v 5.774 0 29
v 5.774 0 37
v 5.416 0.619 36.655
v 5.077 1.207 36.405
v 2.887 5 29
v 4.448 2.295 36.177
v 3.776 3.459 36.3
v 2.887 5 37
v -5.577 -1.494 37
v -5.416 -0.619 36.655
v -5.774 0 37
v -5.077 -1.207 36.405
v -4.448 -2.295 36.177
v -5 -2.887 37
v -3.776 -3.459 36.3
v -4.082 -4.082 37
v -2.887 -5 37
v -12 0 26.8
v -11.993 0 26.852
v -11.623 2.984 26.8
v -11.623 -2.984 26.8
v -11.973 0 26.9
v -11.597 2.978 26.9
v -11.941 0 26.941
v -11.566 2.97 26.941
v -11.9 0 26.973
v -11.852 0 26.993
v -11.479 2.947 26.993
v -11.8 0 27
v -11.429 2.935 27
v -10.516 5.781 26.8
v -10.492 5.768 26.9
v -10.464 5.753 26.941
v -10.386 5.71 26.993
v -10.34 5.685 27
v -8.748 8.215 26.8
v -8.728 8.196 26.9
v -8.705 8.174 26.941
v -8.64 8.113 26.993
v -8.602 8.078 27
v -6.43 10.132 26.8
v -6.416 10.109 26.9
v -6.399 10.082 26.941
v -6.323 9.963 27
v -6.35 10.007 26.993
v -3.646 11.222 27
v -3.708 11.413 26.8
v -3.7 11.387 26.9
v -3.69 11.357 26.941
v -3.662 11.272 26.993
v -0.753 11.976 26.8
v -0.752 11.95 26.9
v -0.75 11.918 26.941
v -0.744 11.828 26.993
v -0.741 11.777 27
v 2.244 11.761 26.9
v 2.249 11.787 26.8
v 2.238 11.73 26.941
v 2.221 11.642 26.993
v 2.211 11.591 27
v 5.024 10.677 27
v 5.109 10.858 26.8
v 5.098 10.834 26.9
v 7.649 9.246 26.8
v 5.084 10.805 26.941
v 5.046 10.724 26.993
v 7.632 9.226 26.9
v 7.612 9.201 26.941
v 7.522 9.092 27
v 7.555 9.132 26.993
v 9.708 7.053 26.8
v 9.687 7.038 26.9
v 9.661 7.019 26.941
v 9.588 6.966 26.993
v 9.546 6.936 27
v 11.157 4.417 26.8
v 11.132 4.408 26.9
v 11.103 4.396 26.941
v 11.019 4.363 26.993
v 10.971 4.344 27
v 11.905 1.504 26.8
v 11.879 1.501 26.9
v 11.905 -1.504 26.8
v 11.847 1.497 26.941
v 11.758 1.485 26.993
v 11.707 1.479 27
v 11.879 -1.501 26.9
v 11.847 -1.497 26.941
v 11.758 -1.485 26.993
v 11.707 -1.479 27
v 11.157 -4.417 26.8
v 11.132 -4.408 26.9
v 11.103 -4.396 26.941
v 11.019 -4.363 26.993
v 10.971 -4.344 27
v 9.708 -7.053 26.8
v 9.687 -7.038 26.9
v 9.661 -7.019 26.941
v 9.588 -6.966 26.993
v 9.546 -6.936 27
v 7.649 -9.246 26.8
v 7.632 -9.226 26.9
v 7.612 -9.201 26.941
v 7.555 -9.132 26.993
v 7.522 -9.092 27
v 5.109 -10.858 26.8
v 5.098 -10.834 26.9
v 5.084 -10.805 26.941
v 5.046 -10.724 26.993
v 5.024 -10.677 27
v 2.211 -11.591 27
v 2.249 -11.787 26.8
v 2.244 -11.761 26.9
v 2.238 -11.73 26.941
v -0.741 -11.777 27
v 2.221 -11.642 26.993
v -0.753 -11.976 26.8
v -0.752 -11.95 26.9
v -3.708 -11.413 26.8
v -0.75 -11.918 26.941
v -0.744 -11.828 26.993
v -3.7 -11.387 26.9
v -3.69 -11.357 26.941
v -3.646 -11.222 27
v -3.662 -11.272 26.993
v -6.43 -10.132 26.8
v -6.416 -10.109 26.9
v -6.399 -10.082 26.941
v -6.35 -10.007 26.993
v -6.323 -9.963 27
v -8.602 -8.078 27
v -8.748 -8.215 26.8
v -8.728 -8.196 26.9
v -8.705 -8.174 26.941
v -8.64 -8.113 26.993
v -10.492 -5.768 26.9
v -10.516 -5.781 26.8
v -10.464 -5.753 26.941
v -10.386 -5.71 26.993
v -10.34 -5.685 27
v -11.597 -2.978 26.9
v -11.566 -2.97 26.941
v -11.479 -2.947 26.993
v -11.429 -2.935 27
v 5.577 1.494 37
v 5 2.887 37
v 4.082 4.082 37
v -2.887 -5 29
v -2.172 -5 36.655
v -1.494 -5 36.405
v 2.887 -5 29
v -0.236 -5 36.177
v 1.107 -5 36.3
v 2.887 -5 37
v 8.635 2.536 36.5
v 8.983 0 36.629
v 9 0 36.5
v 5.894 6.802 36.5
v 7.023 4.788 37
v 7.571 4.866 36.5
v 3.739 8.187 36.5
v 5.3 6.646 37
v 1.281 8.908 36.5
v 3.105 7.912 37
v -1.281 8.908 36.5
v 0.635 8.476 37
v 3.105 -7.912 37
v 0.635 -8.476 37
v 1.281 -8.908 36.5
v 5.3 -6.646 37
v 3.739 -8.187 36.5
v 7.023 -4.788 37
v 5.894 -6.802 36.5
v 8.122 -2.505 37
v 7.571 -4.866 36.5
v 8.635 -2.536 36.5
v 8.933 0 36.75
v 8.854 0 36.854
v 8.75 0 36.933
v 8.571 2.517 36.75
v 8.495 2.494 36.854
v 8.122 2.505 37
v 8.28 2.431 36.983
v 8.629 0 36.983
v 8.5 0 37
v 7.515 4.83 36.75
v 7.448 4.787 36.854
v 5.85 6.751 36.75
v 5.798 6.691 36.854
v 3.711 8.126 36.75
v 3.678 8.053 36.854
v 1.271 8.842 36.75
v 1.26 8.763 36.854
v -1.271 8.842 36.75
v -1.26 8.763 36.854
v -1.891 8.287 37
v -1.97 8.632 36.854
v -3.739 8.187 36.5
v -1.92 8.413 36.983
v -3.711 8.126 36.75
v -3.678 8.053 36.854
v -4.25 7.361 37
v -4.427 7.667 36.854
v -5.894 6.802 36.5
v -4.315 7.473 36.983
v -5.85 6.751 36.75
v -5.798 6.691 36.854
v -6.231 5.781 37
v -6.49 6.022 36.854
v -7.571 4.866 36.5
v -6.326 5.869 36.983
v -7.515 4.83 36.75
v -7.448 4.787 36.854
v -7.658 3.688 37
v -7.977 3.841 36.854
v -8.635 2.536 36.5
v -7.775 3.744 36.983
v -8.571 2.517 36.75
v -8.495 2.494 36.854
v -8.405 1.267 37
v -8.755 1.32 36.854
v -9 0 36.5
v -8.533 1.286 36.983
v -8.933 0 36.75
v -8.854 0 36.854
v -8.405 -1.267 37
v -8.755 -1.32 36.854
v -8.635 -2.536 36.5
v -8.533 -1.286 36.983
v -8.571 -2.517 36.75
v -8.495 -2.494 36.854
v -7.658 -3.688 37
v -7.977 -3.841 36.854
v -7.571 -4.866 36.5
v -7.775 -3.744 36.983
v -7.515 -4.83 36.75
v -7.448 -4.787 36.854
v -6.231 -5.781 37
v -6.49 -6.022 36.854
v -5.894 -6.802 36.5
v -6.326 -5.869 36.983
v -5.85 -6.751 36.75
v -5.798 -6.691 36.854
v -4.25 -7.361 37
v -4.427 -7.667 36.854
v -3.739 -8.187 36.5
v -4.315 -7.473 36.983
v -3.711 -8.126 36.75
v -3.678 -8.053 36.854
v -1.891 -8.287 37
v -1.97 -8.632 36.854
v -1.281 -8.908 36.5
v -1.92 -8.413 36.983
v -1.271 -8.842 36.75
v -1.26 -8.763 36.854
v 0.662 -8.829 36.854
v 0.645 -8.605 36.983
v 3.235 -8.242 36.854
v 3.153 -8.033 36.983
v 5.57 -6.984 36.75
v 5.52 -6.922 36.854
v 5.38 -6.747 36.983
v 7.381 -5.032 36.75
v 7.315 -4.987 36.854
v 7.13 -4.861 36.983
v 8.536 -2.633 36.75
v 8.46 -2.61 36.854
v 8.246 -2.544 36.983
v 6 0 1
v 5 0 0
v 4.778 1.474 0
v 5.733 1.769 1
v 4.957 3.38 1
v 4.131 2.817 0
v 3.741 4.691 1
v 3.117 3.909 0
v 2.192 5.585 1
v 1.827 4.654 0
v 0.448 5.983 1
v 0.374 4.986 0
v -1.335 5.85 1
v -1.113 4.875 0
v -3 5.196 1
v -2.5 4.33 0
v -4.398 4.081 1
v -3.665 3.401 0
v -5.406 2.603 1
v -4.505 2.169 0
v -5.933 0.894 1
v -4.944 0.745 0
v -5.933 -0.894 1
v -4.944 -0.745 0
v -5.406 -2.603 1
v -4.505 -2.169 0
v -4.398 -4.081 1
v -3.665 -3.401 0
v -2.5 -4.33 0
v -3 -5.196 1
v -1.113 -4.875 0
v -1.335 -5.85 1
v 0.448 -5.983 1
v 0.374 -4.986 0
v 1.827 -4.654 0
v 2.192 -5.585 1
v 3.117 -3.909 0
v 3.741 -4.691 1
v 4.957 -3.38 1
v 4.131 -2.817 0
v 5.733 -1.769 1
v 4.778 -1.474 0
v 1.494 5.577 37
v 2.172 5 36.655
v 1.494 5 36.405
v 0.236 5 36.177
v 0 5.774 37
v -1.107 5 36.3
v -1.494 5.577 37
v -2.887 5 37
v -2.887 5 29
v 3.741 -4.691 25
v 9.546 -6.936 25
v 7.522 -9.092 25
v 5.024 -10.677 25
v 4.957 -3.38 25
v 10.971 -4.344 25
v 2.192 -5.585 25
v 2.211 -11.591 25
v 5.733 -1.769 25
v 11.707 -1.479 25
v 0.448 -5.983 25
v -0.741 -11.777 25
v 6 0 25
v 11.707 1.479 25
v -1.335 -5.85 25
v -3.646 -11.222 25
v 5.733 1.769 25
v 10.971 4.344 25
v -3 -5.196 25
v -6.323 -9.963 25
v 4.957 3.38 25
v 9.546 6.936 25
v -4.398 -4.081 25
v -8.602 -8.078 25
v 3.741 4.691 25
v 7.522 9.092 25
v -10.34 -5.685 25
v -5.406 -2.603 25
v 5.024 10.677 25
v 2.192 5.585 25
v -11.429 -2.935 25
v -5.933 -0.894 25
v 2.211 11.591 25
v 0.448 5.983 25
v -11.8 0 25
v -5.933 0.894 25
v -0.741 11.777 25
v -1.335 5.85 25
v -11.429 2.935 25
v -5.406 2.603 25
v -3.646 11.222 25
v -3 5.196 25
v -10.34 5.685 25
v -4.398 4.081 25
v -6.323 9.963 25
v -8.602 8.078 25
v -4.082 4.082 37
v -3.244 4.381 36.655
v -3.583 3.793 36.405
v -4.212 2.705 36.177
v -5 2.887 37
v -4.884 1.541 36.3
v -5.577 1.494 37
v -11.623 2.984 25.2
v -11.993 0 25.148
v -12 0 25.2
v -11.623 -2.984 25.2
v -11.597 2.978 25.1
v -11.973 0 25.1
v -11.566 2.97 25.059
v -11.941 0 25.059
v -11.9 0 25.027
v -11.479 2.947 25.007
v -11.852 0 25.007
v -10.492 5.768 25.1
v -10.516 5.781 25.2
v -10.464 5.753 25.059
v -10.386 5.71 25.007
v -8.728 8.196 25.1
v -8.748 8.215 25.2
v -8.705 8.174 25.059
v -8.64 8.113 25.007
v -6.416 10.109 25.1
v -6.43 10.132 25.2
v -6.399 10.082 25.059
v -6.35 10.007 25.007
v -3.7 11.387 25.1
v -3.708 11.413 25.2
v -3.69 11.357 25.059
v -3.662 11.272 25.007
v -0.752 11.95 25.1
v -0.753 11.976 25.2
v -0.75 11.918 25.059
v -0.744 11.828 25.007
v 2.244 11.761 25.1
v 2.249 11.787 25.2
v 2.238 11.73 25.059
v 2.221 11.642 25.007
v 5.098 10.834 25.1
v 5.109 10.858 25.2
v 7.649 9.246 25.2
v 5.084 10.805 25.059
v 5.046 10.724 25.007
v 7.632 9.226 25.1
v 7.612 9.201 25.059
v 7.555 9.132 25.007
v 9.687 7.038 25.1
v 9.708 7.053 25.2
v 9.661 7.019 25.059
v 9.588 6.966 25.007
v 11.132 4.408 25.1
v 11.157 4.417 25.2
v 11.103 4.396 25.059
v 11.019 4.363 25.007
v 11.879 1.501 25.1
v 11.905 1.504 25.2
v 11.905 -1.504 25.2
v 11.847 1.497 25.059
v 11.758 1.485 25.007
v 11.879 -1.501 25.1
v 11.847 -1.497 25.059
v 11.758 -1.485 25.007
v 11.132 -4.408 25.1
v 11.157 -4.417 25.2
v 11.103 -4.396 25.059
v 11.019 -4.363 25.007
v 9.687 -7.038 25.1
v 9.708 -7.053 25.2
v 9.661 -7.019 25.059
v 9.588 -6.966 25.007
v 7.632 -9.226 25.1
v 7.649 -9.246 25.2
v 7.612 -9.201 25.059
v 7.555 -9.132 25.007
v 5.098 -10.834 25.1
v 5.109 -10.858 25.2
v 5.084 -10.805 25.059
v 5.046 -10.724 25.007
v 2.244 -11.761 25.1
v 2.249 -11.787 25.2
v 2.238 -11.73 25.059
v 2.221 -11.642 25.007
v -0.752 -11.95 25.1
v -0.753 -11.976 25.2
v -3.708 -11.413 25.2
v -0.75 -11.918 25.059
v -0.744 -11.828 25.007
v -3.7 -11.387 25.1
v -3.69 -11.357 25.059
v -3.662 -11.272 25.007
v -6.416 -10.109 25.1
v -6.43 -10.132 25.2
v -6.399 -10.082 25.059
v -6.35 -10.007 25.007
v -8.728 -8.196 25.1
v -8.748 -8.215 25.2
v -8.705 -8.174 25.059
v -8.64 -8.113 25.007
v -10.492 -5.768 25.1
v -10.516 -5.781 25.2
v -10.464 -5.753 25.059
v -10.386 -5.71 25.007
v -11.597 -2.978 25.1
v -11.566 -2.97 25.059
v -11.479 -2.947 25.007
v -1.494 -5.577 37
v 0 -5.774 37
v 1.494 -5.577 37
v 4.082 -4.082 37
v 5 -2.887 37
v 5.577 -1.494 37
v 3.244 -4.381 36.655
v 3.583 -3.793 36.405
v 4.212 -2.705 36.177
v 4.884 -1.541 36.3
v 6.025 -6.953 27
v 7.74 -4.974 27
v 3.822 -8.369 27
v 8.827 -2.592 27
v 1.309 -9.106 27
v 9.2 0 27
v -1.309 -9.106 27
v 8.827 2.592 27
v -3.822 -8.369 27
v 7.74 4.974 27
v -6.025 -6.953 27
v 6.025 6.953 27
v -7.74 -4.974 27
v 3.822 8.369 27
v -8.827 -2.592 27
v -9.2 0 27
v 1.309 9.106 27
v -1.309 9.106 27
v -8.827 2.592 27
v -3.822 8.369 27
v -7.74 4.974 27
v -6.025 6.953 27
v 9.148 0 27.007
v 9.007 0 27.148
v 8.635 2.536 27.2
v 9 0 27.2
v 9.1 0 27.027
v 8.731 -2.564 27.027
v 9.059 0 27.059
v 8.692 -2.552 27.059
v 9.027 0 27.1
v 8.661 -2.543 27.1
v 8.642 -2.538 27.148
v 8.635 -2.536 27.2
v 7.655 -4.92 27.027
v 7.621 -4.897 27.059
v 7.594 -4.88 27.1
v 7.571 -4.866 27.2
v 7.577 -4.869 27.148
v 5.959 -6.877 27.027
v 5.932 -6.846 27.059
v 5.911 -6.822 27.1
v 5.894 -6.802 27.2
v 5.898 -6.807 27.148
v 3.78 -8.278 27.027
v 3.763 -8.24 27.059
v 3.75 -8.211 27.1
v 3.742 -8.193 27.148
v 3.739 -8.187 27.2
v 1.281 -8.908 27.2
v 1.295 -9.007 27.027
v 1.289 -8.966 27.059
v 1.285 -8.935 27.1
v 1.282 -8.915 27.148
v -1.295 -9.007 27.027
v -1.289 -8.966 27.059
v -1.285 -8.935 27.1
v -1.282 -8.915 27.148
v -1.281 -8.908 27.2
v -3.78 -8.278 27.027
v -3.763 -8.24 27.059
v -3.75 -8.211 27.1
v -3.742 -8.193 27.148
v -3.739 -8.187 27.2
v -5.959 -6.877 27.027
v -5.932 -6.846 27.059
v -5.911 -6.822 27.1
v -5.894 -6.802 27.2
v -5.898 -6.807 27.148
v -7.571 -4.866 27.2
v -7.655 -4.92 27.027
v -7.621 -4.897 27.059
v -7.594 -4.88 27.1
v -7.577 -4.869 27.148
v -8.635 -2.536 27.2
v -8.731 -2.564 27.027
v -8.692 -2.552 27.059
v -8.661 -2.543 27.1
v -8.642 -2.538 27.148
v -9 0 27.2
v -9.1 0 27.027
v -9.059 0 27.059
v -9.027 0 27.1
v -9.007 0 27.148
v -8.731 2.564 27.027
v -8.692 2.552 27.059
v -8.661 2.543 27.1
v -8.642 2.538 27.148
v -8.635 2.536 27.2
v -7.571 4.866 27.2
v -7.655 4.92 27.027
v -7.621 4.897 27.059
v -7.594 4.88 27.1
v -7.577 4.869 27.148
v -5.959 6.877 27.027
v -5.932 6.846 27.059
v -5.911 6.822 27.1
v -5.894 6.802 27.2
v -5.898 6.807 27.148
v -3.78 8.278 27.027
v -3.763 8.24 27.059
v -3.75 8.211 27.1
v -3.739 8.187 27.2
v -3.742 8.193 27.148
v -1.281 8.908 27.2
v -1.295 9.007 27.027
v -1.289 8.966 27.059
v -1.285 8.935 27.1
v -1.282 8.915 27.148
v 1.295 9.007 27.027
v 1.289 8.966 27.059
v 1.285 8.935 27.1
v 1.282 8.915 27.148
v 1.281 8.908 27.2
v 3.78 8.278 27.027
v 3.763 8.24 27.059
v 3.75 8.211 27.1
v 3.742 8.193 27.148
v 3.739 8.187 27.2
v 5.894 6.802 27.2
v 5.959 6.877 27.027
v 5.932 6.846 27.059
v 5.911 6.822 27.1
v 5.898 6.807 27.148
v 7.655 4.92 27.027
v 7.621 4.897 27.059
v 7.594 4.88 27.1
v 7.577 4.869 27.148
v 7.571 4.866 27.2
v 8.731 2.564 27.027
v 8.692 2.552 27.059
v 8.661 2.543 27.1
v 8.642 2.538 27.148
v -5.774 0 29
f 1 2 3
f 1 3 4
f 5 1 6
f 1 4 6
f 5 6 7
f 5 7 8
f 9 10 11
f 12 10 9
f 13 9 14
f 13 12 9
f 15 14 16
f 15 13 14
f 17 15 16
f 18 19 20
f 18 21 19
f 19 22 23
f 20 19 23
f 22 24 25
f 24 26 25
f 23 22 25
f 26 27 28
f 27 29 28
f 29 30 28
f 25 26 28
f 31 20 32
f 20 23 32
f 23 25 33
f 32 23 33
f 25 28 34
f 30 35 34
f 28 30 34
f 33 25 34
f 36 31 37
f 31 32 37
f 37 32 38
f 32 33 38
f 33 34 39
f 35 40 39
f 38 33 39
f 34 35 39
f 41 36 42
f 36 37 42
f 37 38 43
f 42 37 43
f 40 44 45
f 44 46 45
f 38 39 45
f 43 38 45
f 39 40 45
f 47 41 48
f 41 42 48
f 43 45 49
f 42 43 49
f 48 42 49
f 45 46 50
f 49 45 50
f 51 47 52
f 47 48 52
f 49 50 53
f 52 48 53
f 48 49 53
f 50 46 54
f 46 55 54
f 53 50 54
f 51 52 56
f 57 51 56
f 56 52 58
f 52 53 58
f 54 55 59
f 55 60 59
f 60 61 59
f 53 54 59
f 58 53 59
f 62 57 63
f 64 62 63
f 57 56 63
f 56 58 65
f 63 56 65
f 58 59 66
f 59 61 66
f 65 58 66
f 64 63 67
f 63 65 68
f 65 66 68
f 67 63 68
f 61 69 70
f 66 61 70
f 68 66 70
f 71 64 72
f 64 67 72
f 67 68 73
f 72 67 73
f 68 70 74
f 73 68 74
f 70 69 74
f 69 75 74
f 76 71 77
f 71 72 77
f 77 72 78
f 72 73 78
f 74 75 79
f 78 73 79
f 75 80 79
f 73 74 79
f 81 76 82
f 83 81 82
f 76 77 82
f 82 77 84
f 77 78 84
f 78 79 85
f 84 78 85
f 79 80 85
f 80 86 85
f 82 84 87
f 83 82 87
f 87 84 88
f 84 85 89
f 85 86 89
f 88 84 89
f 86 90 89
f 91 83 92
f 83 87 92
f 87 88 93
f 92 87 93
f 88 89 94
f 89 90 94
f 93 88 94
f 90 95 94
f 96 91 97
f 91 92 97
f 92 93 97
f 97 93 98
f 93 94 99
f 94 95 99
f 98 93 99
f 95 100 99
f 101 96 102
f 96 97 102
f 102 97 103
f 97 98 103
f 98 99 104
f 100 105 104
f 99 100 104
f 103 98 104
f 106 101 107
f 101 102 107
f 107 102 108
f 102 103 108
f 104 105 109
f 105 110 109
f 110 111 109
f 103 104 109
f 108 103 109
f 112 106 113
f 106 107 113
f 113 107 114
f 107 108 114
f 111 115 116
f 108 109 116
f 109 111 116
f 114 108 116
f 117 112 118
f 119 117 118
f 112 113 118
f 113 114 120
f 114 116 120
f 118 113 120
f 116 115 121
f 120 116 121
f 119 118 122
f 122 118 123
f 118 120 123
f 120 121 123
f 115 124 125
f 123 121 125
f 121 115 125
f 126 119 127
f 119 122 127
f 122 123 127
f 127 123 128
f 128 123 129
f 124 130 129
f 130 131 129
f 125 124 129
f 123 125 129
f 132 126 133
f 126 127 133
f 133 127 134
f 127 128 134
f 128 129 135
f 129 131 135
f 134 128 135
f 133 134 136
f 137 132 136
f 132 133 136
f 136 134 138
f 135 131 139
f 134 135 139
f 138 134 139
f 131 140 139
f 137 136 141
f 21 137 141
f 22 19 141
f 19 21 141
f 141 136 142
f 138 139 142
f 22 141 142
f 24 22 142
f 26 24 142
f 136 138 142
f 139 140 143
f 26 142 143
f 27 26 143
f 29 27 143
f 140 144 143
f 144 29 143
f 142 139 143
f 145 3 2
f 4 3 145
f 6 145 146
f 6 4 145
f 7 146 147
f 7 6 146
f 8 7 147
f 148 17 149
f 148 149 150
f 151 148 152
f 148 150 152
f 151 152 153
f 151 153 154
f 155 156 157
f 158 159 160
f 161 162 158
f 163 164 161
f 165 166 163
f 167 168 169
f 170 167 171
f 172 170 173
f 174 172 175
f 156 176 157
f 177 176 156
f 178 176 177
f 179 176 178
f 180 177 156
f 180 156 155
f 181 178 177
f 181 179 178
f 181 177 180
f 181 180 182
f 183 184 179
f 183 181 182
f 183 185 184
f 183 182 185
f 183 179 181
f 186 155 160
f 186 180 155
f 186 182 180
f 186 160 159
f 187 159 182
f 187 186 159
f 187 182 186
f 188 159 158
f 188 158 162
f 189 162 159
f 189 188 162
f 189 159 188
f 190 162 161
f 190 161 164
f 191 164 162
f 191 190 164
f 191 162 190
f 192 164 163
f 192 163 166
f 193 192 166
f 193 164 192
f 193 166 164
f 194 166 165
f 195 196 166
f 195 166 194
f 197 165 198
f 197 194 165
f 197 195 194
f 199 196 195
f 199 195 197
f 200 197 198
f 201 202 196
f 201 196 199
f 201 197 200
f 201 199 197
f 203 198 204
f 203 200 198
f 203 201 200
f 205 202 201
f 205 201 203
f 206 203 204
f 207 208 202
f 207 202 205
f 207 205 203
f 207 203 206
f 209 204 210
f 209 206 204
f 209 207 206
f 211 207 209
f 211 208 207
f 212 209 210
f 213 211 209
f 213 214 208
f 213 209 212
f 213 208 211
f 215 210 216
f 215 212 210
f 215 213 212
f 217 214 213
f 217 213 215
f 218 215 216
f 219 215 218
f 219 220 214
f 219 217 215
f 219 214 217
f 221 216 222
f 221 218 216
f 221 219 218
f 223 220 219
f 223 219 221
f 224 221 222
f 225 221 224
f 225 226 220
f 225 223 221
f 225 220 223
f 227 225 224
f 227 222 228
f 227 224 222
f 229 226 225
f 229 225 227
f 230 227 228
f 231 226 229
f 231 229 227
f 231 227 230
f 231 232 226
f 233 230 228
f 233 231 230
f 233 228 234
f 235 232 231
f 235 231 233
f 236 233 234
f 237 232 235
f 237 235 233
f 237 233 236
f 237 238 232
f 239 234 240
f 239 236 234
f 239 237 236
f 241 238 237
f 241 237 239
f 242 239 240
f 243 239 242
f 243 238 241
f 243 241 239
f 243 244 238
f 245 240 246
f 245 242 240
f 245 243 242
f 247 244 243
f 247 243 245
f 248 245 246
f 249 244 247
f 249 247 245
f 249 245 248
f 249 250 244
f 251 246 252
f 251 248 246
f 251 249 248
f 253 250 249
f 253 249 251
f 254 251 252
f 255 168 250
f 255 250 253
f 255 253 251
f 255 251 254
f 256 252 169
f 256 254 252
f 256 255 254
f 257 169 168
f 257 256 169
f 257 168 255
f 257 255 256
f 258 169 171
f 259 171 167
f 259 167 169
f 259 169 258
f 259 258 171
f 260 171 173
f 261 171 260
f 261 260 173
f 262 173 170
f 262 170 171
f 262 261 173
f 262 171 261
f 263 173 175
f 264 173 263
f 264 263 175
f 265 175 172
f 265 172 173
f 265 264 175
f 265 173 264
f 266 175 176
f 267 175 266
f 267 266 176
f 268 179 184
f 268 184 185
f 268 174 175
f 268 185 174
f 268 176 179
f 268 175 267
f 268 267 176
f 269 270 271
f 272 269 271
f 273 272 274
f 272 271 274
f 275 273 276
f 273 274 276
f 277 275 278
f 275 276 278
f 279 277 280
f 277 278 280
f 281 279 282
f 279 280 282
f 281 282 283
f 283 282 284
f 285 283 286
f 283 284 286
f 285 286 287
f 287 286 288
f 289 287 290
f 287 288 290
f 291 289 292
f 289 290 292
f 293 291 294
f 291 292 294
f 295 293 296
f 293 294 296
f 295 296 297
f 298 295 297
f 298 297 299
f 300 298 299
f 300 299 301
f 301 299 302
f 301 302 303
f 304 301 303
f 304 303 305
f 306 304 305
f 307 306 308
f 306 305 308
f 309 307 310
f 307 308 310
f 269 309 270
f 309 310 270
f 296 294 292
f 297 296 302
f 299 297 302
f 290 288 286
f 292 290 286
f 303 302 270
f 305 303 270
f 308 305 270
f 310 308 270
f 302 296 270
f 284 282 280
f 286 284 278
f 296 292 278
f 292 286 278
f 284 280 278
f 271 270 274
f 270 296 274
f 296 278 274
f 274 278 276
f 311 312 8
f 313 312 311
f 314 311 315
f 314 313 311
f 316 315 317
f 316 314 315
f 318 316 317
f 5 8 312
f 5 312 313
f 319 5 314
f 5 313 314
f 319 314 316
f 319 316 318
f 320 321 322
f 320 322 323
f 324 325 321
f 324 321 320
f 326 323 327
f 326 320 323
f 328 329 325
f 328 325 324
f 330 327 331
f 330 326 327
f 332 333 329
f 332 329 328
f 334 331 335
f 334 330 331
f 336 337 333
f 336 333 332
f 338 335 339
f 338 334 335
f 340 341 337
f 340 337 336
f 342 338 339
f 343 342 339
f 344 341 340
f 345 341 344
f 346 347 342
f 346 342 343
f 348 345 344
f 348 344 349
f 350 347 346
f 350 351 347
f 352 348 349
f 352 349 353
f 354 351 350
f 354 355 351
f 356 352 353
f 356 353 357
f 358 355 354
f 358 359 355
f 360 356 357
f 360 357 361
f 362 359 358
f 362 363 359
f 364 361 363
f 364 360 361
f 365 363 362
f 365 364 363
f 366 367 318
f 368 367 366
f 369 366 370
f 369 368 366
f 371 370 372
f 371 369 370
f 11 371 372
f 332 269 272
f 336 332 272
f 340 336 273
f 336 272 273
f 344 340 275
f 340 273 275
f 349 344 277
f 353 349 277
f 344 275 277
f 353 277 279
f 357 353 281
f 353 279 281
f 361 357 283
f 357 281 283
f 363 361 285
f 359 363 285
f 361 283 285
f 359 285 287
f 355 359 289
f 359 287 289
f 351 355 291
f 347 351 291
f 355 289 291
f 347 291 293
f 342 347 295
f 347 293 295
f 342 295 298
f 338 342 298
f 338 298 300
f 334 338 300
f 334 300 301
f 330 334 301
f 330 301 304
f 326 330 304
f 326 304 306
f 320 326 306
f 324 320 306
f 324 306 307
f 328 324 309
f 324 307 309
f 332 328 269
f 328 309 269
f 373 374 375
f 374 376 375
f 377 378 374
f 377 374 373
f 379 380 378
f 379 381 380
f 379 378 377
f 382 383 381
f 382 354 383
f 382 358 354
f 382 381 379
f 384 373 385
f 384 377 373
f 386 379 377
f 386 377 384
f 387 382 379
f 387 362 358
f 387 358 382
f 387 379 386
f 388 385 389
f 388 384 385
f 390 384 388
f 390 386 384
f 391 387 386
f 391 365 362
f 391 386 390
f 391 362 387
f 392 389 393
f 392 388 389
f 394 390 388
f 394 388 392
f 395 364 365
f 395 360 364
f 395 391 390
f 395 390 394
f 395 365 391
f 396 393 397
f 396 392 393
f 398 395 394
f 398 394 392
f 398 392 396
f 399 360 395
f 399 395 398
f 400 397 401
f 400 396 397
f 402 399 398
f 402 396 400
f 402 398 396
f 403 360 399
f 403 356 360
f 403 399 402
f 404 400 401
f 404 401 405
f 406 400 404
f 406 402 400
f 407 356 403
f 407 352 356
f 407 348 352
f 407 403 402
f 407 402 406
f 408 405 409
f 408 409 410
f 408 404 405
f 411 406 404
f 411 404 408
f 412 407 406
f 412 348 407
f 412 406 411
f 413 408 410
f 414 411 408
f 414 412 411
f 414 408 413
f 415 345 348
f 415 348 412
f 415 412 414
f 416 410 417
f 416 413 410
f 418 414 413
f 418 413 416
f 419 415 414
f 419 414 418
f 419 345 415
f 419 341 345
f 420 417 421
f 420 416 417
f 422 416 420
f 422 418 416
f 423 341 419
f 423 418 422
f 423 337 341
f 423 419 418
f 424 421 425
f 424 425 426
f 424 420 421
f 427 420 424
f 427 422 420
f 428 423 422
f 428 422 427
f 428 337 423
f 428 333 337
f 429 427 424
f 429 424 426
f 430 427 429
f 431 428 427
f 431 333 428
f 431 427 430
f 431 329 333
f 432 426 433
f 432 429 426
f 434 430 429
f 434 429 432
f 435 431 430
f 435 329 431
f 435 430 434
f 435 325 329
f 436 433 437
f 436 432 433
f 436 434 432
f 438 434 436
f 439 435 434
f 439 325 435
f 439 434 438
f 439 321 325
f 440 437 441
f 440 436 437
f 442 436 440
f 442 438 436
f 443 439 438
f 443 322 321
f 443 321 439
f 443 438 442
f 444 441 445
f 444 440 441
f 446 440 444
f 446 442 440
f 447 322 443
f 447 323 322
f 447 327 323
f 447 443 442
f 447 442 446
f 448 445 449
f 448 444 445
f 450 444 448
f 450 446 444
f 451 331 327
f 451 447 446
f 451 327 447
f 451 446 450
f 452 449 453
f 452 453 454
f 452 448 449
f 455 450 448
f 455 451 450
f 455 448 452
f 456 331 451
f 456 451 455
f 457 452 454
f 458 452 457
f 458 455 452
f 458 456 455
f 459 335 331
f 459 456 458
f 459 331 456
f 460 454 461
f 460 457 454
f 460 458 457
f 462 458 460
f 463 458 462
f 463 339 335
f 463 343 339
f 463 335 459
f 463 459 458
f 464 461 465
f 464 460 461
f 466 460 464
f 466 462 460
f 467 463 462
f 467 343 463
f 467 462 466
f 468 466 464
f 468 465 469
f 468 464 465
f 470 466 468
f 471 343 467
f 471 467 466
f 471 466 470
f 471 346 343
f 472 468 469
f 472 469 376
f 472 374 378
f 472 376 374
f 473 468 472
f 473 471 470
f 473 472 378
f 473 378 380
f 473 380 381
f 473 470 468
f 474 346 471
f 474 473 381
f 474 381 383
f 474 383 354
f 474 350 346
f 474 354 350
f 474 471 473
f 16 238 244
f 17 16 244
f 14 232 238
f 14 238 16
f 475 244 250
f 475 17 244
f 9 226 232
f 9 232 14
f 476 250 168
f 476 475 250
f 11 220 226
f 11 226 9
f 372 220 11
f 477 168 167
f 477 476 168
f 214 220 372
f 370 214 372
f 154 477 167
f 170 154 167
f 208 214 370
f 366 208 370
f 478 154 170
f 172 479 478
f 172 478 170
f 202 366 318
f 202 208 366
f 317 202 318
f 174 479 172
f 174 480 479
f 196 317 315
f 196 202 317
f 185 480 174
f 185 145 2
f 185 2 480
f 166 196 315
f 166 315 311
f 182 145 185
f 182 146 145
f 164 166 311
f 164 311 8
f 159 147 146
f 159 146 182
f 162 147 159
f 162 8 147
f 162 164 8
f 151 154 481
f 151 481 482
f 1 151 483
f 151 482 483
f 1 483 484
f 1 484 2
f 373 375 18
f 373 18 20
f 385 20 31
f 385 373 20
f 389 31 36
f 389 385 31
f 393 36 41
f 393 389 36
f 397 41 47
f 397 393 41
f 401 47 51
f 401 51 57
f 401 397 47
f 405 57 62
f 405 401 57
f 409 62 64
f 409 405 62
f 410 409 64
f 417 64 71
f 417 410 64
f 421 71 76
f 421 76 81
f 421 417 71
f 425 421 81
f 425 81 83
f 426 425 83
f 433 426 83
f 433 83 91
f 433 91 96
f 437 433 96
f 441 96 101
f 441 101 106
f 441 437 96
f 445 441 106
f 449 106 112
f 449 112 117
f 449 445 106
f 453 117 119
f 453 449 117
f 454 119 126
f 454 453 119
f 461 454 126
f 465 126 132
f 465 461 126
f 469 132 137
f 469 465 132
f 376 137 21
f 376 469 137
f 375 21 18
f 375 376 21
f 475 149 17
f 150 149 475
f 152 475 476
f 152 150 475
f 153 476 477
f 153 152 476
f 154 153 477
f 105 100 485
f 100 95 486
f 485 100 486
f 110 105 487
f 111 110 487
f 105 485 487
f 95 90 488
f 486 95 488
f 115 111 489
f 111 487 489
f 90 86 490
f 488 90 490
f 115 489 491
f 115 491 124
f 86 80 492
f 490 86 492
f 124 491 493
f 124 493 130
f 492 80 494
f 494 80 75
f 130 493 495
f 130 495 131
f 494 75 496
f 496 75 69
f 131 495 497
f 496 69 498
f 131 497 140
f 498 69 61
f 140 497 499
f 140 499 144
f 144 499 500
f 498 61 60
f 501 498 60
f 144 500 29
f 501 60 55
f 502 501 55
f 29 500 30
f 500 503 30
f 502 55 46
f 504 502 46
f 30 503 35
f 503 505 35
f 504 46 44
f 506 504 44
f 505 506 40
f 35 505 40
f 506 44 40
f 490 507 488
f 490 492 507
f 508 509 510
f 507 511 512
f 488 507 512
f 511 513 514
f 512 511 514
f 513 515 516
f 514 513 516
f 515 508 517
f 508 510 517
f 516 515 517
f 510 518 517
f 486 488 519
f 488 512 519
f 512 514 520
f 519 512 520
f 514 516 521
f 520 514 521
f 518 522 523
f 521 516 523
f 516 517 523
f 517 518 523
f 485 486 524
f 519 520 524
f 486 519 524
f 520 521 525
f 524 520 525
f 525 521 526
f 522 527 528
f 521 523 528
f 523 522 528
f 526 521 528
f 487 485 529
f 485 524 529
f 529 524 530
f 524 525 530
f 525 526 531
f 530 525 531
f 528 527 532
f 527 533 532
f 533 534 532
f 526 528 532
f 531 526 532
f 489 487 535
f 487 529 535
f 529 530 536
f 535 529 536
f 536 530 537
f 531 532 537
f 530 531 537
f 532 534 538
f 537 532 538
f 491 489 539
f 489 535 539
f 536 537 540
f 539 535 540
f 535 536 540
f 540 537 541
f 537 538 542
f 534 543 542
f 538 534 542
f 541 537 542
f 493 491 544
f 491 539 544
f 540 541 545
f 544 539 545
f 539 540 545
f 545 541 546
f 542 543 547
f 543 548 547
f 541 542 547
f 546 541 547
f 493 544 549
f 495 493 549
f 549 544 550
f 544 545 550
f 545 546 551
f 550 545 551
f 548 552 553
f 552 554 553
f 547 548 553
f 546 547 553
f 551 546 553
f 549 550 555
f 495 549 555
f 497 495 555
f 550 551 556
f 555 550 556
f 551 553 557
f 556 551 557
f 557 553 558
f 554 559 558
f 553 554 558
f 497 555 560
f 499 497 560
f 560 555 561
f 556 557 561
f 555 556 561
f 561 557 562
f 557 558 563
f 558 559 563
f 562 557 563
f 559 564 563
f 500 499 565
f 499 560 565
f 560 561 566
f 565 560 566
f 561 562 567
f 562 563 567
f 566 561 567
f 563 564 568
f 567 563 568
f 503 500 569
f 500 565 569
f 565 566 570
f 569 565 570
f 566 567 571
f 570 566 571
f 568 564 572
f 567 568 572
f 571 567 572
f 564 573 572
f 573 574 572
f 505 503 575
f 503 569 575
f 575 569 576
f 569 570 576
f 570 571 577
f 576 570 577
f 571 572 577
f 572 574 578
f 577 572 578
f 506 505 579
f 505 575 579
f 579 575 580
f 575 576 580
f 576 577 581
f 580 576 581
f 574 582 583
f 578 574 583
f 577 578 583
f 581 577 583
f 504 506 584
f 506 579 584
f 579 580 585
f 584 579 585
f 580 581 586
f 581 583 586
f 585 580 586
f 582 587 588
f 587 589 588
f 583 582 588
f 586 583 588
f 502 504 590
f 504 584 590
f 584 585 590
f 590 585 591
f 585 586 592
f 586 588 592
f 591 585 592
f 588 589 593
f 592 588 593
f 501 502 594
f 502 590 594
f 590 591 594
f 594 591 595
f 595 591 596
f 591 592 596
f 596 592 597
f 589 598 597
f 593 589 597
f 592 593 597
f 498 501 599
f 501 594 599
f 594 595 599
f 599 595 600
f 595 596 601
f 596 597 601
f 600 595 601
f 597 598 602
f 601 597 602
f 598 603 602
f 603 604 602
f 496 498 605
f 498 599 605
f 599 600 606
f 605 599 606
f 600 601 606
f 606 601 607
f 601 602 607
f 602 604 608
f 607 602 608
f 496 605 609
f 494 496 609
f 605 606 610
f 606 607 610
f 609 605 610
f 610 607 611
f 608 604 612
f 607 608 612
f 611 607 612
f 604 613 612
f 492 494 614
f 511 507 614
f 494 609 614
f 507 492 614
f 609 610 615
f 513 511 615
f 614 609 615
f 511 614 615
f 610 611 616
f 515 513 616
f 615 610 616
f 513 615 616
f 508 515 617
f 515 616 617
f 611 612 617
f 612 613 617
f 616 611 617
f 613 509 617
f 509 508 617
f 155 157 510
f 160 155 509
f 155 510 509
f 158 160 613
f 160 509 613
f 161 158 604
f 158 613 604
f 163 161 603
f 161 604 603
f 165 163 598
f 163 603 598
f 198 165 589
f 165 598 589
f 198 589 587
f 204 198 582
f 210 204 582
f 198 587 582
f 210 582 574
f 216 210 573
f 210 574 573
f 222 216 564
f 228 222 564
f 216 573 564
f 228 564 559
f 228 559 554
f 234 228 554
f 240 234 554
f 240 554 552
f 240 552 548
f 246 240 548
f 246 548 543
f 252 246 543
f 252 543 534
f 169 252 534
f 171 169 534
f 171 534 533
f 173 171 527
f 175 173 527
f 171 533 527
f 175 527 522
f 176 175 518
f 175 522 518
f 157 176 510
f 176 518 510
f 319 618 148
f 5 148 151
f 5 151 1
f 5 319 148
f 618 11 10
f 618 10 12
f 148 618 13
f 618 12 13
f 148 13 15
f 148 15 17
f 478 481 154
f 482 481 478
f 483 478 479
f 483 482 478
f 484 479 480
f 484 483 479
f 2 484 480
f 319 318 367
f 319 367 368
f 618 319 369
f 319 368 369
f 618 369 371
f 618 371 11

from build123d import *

# Parameters (mm, degrees)
SCHIZZO1_R                   = 6
ESTRUSIONE_ESTRUSIONE1_DEPTH = 25
SMUSSO1_SIZE                 = 1
SCHIZZO6_R                   = 9
ESTRUSIONE_ESTRUSIONE3_DEPTH = 12
TAGLIO_ESTRUSIONE3_DEPTH     = 8
SCHIZZO8_R                   = 5.773502692
TAGLIO_ESTRUSIONE4_DEPTH     = 1
TAGLIO_ESTRUSIONE4_TAPER     = 43
RACCORDO4_R                  = 0.5
SCHIZZO9_R                   = 12
SCHIZZO9_R_2                 = 9
ESTRUSIONE_ESTRUSIONE4_DEPTH = 2
RACCORDO5_R                  = 0.2


with BuildPart() as part:
    # Schizzo1 → Estrusione-Estrusione1 (new body)
    with BuildSketch(Plane.XY):
        Circle(SCHIZZO1_R)
    extrude(amount=ESTRUSIONE_ESTRUSIONE1_DEPTH)

    # Smusso1
    smusso1_edges = [part.edges().sort_by_distance(p)[0] for p in [
        (-6, 0, 0),
    ]]
    chamfer(smusso1_edges, length=SMUSSO1_SIZE)

    # Schizzo6 → Estrusione-Estrusione3 (add)
    with BuildSketch(Plane.XY.offset(25)):
        Circle(SCHIZZO6_R)
    extrude(amount=ESTRUSIONE_ESTRUSIONE3_DEPTH)

    # Schizzo7 → Taglio-Estrusione3 (cut)
    with BuildSketch(Plane.XY.offset(37)):
        Polygon((2.886751346, 5), (-2.886751346, 5), (-5.773502692, 0), (-2.886751346, -5), (2.886751346, -5), (5.773502692, 0), align=None)
    extrude(amount=-TAGLIO_ESTRUSIONE3_DEPTH, mode=Mode.SUBTRACT)

    # Schizzo8 → Taglio-Estrusione4 (cut)
    with BuildSketch(Plane.XY.offset(37)):
        Circle(SCHIZZO8_R)
    extrude(amount=-TAGLIO_ESTRUSIONE4_DEPTH, taper=TAGLIO_ESTRUSIONE4_TAPER, mode=Mode.SUBTRACT)

    # Raccordo4
    raccordo4_edges = [part.edges().sort_by_distance(p)[0] for p in [
        (-9, 0, 37),
    ]]
    fillet(raccordo4_edges, radius=RACCORDO4_R)

    # Schizzo9 → Estrusione-Estrusione4 (add)
    with BuildSketch(Plane(origin=(0, 0, 25), x_dir=(-1, 0, 0), z_dir=(0, 0, -1))):
        Circle(SCHIZZO9_R)
        Circle(SCHIZZO9_R_2, mode=Mode.SUBTRACT)
    extrude(amount=-ESTRUSIONE_ESTRUSIONE4_DEPTH)

    # Raccordo5
    raccordo5_edges = [part.edges().sort_by_distance(p)[0] for p in [
        (-9, 0, 27),
        (12, 0, 27),
        (12, 0, 25),
    ]]
    fillet(raccordo5_edges, radius=RACCORDO5_R)


solid = part.part
